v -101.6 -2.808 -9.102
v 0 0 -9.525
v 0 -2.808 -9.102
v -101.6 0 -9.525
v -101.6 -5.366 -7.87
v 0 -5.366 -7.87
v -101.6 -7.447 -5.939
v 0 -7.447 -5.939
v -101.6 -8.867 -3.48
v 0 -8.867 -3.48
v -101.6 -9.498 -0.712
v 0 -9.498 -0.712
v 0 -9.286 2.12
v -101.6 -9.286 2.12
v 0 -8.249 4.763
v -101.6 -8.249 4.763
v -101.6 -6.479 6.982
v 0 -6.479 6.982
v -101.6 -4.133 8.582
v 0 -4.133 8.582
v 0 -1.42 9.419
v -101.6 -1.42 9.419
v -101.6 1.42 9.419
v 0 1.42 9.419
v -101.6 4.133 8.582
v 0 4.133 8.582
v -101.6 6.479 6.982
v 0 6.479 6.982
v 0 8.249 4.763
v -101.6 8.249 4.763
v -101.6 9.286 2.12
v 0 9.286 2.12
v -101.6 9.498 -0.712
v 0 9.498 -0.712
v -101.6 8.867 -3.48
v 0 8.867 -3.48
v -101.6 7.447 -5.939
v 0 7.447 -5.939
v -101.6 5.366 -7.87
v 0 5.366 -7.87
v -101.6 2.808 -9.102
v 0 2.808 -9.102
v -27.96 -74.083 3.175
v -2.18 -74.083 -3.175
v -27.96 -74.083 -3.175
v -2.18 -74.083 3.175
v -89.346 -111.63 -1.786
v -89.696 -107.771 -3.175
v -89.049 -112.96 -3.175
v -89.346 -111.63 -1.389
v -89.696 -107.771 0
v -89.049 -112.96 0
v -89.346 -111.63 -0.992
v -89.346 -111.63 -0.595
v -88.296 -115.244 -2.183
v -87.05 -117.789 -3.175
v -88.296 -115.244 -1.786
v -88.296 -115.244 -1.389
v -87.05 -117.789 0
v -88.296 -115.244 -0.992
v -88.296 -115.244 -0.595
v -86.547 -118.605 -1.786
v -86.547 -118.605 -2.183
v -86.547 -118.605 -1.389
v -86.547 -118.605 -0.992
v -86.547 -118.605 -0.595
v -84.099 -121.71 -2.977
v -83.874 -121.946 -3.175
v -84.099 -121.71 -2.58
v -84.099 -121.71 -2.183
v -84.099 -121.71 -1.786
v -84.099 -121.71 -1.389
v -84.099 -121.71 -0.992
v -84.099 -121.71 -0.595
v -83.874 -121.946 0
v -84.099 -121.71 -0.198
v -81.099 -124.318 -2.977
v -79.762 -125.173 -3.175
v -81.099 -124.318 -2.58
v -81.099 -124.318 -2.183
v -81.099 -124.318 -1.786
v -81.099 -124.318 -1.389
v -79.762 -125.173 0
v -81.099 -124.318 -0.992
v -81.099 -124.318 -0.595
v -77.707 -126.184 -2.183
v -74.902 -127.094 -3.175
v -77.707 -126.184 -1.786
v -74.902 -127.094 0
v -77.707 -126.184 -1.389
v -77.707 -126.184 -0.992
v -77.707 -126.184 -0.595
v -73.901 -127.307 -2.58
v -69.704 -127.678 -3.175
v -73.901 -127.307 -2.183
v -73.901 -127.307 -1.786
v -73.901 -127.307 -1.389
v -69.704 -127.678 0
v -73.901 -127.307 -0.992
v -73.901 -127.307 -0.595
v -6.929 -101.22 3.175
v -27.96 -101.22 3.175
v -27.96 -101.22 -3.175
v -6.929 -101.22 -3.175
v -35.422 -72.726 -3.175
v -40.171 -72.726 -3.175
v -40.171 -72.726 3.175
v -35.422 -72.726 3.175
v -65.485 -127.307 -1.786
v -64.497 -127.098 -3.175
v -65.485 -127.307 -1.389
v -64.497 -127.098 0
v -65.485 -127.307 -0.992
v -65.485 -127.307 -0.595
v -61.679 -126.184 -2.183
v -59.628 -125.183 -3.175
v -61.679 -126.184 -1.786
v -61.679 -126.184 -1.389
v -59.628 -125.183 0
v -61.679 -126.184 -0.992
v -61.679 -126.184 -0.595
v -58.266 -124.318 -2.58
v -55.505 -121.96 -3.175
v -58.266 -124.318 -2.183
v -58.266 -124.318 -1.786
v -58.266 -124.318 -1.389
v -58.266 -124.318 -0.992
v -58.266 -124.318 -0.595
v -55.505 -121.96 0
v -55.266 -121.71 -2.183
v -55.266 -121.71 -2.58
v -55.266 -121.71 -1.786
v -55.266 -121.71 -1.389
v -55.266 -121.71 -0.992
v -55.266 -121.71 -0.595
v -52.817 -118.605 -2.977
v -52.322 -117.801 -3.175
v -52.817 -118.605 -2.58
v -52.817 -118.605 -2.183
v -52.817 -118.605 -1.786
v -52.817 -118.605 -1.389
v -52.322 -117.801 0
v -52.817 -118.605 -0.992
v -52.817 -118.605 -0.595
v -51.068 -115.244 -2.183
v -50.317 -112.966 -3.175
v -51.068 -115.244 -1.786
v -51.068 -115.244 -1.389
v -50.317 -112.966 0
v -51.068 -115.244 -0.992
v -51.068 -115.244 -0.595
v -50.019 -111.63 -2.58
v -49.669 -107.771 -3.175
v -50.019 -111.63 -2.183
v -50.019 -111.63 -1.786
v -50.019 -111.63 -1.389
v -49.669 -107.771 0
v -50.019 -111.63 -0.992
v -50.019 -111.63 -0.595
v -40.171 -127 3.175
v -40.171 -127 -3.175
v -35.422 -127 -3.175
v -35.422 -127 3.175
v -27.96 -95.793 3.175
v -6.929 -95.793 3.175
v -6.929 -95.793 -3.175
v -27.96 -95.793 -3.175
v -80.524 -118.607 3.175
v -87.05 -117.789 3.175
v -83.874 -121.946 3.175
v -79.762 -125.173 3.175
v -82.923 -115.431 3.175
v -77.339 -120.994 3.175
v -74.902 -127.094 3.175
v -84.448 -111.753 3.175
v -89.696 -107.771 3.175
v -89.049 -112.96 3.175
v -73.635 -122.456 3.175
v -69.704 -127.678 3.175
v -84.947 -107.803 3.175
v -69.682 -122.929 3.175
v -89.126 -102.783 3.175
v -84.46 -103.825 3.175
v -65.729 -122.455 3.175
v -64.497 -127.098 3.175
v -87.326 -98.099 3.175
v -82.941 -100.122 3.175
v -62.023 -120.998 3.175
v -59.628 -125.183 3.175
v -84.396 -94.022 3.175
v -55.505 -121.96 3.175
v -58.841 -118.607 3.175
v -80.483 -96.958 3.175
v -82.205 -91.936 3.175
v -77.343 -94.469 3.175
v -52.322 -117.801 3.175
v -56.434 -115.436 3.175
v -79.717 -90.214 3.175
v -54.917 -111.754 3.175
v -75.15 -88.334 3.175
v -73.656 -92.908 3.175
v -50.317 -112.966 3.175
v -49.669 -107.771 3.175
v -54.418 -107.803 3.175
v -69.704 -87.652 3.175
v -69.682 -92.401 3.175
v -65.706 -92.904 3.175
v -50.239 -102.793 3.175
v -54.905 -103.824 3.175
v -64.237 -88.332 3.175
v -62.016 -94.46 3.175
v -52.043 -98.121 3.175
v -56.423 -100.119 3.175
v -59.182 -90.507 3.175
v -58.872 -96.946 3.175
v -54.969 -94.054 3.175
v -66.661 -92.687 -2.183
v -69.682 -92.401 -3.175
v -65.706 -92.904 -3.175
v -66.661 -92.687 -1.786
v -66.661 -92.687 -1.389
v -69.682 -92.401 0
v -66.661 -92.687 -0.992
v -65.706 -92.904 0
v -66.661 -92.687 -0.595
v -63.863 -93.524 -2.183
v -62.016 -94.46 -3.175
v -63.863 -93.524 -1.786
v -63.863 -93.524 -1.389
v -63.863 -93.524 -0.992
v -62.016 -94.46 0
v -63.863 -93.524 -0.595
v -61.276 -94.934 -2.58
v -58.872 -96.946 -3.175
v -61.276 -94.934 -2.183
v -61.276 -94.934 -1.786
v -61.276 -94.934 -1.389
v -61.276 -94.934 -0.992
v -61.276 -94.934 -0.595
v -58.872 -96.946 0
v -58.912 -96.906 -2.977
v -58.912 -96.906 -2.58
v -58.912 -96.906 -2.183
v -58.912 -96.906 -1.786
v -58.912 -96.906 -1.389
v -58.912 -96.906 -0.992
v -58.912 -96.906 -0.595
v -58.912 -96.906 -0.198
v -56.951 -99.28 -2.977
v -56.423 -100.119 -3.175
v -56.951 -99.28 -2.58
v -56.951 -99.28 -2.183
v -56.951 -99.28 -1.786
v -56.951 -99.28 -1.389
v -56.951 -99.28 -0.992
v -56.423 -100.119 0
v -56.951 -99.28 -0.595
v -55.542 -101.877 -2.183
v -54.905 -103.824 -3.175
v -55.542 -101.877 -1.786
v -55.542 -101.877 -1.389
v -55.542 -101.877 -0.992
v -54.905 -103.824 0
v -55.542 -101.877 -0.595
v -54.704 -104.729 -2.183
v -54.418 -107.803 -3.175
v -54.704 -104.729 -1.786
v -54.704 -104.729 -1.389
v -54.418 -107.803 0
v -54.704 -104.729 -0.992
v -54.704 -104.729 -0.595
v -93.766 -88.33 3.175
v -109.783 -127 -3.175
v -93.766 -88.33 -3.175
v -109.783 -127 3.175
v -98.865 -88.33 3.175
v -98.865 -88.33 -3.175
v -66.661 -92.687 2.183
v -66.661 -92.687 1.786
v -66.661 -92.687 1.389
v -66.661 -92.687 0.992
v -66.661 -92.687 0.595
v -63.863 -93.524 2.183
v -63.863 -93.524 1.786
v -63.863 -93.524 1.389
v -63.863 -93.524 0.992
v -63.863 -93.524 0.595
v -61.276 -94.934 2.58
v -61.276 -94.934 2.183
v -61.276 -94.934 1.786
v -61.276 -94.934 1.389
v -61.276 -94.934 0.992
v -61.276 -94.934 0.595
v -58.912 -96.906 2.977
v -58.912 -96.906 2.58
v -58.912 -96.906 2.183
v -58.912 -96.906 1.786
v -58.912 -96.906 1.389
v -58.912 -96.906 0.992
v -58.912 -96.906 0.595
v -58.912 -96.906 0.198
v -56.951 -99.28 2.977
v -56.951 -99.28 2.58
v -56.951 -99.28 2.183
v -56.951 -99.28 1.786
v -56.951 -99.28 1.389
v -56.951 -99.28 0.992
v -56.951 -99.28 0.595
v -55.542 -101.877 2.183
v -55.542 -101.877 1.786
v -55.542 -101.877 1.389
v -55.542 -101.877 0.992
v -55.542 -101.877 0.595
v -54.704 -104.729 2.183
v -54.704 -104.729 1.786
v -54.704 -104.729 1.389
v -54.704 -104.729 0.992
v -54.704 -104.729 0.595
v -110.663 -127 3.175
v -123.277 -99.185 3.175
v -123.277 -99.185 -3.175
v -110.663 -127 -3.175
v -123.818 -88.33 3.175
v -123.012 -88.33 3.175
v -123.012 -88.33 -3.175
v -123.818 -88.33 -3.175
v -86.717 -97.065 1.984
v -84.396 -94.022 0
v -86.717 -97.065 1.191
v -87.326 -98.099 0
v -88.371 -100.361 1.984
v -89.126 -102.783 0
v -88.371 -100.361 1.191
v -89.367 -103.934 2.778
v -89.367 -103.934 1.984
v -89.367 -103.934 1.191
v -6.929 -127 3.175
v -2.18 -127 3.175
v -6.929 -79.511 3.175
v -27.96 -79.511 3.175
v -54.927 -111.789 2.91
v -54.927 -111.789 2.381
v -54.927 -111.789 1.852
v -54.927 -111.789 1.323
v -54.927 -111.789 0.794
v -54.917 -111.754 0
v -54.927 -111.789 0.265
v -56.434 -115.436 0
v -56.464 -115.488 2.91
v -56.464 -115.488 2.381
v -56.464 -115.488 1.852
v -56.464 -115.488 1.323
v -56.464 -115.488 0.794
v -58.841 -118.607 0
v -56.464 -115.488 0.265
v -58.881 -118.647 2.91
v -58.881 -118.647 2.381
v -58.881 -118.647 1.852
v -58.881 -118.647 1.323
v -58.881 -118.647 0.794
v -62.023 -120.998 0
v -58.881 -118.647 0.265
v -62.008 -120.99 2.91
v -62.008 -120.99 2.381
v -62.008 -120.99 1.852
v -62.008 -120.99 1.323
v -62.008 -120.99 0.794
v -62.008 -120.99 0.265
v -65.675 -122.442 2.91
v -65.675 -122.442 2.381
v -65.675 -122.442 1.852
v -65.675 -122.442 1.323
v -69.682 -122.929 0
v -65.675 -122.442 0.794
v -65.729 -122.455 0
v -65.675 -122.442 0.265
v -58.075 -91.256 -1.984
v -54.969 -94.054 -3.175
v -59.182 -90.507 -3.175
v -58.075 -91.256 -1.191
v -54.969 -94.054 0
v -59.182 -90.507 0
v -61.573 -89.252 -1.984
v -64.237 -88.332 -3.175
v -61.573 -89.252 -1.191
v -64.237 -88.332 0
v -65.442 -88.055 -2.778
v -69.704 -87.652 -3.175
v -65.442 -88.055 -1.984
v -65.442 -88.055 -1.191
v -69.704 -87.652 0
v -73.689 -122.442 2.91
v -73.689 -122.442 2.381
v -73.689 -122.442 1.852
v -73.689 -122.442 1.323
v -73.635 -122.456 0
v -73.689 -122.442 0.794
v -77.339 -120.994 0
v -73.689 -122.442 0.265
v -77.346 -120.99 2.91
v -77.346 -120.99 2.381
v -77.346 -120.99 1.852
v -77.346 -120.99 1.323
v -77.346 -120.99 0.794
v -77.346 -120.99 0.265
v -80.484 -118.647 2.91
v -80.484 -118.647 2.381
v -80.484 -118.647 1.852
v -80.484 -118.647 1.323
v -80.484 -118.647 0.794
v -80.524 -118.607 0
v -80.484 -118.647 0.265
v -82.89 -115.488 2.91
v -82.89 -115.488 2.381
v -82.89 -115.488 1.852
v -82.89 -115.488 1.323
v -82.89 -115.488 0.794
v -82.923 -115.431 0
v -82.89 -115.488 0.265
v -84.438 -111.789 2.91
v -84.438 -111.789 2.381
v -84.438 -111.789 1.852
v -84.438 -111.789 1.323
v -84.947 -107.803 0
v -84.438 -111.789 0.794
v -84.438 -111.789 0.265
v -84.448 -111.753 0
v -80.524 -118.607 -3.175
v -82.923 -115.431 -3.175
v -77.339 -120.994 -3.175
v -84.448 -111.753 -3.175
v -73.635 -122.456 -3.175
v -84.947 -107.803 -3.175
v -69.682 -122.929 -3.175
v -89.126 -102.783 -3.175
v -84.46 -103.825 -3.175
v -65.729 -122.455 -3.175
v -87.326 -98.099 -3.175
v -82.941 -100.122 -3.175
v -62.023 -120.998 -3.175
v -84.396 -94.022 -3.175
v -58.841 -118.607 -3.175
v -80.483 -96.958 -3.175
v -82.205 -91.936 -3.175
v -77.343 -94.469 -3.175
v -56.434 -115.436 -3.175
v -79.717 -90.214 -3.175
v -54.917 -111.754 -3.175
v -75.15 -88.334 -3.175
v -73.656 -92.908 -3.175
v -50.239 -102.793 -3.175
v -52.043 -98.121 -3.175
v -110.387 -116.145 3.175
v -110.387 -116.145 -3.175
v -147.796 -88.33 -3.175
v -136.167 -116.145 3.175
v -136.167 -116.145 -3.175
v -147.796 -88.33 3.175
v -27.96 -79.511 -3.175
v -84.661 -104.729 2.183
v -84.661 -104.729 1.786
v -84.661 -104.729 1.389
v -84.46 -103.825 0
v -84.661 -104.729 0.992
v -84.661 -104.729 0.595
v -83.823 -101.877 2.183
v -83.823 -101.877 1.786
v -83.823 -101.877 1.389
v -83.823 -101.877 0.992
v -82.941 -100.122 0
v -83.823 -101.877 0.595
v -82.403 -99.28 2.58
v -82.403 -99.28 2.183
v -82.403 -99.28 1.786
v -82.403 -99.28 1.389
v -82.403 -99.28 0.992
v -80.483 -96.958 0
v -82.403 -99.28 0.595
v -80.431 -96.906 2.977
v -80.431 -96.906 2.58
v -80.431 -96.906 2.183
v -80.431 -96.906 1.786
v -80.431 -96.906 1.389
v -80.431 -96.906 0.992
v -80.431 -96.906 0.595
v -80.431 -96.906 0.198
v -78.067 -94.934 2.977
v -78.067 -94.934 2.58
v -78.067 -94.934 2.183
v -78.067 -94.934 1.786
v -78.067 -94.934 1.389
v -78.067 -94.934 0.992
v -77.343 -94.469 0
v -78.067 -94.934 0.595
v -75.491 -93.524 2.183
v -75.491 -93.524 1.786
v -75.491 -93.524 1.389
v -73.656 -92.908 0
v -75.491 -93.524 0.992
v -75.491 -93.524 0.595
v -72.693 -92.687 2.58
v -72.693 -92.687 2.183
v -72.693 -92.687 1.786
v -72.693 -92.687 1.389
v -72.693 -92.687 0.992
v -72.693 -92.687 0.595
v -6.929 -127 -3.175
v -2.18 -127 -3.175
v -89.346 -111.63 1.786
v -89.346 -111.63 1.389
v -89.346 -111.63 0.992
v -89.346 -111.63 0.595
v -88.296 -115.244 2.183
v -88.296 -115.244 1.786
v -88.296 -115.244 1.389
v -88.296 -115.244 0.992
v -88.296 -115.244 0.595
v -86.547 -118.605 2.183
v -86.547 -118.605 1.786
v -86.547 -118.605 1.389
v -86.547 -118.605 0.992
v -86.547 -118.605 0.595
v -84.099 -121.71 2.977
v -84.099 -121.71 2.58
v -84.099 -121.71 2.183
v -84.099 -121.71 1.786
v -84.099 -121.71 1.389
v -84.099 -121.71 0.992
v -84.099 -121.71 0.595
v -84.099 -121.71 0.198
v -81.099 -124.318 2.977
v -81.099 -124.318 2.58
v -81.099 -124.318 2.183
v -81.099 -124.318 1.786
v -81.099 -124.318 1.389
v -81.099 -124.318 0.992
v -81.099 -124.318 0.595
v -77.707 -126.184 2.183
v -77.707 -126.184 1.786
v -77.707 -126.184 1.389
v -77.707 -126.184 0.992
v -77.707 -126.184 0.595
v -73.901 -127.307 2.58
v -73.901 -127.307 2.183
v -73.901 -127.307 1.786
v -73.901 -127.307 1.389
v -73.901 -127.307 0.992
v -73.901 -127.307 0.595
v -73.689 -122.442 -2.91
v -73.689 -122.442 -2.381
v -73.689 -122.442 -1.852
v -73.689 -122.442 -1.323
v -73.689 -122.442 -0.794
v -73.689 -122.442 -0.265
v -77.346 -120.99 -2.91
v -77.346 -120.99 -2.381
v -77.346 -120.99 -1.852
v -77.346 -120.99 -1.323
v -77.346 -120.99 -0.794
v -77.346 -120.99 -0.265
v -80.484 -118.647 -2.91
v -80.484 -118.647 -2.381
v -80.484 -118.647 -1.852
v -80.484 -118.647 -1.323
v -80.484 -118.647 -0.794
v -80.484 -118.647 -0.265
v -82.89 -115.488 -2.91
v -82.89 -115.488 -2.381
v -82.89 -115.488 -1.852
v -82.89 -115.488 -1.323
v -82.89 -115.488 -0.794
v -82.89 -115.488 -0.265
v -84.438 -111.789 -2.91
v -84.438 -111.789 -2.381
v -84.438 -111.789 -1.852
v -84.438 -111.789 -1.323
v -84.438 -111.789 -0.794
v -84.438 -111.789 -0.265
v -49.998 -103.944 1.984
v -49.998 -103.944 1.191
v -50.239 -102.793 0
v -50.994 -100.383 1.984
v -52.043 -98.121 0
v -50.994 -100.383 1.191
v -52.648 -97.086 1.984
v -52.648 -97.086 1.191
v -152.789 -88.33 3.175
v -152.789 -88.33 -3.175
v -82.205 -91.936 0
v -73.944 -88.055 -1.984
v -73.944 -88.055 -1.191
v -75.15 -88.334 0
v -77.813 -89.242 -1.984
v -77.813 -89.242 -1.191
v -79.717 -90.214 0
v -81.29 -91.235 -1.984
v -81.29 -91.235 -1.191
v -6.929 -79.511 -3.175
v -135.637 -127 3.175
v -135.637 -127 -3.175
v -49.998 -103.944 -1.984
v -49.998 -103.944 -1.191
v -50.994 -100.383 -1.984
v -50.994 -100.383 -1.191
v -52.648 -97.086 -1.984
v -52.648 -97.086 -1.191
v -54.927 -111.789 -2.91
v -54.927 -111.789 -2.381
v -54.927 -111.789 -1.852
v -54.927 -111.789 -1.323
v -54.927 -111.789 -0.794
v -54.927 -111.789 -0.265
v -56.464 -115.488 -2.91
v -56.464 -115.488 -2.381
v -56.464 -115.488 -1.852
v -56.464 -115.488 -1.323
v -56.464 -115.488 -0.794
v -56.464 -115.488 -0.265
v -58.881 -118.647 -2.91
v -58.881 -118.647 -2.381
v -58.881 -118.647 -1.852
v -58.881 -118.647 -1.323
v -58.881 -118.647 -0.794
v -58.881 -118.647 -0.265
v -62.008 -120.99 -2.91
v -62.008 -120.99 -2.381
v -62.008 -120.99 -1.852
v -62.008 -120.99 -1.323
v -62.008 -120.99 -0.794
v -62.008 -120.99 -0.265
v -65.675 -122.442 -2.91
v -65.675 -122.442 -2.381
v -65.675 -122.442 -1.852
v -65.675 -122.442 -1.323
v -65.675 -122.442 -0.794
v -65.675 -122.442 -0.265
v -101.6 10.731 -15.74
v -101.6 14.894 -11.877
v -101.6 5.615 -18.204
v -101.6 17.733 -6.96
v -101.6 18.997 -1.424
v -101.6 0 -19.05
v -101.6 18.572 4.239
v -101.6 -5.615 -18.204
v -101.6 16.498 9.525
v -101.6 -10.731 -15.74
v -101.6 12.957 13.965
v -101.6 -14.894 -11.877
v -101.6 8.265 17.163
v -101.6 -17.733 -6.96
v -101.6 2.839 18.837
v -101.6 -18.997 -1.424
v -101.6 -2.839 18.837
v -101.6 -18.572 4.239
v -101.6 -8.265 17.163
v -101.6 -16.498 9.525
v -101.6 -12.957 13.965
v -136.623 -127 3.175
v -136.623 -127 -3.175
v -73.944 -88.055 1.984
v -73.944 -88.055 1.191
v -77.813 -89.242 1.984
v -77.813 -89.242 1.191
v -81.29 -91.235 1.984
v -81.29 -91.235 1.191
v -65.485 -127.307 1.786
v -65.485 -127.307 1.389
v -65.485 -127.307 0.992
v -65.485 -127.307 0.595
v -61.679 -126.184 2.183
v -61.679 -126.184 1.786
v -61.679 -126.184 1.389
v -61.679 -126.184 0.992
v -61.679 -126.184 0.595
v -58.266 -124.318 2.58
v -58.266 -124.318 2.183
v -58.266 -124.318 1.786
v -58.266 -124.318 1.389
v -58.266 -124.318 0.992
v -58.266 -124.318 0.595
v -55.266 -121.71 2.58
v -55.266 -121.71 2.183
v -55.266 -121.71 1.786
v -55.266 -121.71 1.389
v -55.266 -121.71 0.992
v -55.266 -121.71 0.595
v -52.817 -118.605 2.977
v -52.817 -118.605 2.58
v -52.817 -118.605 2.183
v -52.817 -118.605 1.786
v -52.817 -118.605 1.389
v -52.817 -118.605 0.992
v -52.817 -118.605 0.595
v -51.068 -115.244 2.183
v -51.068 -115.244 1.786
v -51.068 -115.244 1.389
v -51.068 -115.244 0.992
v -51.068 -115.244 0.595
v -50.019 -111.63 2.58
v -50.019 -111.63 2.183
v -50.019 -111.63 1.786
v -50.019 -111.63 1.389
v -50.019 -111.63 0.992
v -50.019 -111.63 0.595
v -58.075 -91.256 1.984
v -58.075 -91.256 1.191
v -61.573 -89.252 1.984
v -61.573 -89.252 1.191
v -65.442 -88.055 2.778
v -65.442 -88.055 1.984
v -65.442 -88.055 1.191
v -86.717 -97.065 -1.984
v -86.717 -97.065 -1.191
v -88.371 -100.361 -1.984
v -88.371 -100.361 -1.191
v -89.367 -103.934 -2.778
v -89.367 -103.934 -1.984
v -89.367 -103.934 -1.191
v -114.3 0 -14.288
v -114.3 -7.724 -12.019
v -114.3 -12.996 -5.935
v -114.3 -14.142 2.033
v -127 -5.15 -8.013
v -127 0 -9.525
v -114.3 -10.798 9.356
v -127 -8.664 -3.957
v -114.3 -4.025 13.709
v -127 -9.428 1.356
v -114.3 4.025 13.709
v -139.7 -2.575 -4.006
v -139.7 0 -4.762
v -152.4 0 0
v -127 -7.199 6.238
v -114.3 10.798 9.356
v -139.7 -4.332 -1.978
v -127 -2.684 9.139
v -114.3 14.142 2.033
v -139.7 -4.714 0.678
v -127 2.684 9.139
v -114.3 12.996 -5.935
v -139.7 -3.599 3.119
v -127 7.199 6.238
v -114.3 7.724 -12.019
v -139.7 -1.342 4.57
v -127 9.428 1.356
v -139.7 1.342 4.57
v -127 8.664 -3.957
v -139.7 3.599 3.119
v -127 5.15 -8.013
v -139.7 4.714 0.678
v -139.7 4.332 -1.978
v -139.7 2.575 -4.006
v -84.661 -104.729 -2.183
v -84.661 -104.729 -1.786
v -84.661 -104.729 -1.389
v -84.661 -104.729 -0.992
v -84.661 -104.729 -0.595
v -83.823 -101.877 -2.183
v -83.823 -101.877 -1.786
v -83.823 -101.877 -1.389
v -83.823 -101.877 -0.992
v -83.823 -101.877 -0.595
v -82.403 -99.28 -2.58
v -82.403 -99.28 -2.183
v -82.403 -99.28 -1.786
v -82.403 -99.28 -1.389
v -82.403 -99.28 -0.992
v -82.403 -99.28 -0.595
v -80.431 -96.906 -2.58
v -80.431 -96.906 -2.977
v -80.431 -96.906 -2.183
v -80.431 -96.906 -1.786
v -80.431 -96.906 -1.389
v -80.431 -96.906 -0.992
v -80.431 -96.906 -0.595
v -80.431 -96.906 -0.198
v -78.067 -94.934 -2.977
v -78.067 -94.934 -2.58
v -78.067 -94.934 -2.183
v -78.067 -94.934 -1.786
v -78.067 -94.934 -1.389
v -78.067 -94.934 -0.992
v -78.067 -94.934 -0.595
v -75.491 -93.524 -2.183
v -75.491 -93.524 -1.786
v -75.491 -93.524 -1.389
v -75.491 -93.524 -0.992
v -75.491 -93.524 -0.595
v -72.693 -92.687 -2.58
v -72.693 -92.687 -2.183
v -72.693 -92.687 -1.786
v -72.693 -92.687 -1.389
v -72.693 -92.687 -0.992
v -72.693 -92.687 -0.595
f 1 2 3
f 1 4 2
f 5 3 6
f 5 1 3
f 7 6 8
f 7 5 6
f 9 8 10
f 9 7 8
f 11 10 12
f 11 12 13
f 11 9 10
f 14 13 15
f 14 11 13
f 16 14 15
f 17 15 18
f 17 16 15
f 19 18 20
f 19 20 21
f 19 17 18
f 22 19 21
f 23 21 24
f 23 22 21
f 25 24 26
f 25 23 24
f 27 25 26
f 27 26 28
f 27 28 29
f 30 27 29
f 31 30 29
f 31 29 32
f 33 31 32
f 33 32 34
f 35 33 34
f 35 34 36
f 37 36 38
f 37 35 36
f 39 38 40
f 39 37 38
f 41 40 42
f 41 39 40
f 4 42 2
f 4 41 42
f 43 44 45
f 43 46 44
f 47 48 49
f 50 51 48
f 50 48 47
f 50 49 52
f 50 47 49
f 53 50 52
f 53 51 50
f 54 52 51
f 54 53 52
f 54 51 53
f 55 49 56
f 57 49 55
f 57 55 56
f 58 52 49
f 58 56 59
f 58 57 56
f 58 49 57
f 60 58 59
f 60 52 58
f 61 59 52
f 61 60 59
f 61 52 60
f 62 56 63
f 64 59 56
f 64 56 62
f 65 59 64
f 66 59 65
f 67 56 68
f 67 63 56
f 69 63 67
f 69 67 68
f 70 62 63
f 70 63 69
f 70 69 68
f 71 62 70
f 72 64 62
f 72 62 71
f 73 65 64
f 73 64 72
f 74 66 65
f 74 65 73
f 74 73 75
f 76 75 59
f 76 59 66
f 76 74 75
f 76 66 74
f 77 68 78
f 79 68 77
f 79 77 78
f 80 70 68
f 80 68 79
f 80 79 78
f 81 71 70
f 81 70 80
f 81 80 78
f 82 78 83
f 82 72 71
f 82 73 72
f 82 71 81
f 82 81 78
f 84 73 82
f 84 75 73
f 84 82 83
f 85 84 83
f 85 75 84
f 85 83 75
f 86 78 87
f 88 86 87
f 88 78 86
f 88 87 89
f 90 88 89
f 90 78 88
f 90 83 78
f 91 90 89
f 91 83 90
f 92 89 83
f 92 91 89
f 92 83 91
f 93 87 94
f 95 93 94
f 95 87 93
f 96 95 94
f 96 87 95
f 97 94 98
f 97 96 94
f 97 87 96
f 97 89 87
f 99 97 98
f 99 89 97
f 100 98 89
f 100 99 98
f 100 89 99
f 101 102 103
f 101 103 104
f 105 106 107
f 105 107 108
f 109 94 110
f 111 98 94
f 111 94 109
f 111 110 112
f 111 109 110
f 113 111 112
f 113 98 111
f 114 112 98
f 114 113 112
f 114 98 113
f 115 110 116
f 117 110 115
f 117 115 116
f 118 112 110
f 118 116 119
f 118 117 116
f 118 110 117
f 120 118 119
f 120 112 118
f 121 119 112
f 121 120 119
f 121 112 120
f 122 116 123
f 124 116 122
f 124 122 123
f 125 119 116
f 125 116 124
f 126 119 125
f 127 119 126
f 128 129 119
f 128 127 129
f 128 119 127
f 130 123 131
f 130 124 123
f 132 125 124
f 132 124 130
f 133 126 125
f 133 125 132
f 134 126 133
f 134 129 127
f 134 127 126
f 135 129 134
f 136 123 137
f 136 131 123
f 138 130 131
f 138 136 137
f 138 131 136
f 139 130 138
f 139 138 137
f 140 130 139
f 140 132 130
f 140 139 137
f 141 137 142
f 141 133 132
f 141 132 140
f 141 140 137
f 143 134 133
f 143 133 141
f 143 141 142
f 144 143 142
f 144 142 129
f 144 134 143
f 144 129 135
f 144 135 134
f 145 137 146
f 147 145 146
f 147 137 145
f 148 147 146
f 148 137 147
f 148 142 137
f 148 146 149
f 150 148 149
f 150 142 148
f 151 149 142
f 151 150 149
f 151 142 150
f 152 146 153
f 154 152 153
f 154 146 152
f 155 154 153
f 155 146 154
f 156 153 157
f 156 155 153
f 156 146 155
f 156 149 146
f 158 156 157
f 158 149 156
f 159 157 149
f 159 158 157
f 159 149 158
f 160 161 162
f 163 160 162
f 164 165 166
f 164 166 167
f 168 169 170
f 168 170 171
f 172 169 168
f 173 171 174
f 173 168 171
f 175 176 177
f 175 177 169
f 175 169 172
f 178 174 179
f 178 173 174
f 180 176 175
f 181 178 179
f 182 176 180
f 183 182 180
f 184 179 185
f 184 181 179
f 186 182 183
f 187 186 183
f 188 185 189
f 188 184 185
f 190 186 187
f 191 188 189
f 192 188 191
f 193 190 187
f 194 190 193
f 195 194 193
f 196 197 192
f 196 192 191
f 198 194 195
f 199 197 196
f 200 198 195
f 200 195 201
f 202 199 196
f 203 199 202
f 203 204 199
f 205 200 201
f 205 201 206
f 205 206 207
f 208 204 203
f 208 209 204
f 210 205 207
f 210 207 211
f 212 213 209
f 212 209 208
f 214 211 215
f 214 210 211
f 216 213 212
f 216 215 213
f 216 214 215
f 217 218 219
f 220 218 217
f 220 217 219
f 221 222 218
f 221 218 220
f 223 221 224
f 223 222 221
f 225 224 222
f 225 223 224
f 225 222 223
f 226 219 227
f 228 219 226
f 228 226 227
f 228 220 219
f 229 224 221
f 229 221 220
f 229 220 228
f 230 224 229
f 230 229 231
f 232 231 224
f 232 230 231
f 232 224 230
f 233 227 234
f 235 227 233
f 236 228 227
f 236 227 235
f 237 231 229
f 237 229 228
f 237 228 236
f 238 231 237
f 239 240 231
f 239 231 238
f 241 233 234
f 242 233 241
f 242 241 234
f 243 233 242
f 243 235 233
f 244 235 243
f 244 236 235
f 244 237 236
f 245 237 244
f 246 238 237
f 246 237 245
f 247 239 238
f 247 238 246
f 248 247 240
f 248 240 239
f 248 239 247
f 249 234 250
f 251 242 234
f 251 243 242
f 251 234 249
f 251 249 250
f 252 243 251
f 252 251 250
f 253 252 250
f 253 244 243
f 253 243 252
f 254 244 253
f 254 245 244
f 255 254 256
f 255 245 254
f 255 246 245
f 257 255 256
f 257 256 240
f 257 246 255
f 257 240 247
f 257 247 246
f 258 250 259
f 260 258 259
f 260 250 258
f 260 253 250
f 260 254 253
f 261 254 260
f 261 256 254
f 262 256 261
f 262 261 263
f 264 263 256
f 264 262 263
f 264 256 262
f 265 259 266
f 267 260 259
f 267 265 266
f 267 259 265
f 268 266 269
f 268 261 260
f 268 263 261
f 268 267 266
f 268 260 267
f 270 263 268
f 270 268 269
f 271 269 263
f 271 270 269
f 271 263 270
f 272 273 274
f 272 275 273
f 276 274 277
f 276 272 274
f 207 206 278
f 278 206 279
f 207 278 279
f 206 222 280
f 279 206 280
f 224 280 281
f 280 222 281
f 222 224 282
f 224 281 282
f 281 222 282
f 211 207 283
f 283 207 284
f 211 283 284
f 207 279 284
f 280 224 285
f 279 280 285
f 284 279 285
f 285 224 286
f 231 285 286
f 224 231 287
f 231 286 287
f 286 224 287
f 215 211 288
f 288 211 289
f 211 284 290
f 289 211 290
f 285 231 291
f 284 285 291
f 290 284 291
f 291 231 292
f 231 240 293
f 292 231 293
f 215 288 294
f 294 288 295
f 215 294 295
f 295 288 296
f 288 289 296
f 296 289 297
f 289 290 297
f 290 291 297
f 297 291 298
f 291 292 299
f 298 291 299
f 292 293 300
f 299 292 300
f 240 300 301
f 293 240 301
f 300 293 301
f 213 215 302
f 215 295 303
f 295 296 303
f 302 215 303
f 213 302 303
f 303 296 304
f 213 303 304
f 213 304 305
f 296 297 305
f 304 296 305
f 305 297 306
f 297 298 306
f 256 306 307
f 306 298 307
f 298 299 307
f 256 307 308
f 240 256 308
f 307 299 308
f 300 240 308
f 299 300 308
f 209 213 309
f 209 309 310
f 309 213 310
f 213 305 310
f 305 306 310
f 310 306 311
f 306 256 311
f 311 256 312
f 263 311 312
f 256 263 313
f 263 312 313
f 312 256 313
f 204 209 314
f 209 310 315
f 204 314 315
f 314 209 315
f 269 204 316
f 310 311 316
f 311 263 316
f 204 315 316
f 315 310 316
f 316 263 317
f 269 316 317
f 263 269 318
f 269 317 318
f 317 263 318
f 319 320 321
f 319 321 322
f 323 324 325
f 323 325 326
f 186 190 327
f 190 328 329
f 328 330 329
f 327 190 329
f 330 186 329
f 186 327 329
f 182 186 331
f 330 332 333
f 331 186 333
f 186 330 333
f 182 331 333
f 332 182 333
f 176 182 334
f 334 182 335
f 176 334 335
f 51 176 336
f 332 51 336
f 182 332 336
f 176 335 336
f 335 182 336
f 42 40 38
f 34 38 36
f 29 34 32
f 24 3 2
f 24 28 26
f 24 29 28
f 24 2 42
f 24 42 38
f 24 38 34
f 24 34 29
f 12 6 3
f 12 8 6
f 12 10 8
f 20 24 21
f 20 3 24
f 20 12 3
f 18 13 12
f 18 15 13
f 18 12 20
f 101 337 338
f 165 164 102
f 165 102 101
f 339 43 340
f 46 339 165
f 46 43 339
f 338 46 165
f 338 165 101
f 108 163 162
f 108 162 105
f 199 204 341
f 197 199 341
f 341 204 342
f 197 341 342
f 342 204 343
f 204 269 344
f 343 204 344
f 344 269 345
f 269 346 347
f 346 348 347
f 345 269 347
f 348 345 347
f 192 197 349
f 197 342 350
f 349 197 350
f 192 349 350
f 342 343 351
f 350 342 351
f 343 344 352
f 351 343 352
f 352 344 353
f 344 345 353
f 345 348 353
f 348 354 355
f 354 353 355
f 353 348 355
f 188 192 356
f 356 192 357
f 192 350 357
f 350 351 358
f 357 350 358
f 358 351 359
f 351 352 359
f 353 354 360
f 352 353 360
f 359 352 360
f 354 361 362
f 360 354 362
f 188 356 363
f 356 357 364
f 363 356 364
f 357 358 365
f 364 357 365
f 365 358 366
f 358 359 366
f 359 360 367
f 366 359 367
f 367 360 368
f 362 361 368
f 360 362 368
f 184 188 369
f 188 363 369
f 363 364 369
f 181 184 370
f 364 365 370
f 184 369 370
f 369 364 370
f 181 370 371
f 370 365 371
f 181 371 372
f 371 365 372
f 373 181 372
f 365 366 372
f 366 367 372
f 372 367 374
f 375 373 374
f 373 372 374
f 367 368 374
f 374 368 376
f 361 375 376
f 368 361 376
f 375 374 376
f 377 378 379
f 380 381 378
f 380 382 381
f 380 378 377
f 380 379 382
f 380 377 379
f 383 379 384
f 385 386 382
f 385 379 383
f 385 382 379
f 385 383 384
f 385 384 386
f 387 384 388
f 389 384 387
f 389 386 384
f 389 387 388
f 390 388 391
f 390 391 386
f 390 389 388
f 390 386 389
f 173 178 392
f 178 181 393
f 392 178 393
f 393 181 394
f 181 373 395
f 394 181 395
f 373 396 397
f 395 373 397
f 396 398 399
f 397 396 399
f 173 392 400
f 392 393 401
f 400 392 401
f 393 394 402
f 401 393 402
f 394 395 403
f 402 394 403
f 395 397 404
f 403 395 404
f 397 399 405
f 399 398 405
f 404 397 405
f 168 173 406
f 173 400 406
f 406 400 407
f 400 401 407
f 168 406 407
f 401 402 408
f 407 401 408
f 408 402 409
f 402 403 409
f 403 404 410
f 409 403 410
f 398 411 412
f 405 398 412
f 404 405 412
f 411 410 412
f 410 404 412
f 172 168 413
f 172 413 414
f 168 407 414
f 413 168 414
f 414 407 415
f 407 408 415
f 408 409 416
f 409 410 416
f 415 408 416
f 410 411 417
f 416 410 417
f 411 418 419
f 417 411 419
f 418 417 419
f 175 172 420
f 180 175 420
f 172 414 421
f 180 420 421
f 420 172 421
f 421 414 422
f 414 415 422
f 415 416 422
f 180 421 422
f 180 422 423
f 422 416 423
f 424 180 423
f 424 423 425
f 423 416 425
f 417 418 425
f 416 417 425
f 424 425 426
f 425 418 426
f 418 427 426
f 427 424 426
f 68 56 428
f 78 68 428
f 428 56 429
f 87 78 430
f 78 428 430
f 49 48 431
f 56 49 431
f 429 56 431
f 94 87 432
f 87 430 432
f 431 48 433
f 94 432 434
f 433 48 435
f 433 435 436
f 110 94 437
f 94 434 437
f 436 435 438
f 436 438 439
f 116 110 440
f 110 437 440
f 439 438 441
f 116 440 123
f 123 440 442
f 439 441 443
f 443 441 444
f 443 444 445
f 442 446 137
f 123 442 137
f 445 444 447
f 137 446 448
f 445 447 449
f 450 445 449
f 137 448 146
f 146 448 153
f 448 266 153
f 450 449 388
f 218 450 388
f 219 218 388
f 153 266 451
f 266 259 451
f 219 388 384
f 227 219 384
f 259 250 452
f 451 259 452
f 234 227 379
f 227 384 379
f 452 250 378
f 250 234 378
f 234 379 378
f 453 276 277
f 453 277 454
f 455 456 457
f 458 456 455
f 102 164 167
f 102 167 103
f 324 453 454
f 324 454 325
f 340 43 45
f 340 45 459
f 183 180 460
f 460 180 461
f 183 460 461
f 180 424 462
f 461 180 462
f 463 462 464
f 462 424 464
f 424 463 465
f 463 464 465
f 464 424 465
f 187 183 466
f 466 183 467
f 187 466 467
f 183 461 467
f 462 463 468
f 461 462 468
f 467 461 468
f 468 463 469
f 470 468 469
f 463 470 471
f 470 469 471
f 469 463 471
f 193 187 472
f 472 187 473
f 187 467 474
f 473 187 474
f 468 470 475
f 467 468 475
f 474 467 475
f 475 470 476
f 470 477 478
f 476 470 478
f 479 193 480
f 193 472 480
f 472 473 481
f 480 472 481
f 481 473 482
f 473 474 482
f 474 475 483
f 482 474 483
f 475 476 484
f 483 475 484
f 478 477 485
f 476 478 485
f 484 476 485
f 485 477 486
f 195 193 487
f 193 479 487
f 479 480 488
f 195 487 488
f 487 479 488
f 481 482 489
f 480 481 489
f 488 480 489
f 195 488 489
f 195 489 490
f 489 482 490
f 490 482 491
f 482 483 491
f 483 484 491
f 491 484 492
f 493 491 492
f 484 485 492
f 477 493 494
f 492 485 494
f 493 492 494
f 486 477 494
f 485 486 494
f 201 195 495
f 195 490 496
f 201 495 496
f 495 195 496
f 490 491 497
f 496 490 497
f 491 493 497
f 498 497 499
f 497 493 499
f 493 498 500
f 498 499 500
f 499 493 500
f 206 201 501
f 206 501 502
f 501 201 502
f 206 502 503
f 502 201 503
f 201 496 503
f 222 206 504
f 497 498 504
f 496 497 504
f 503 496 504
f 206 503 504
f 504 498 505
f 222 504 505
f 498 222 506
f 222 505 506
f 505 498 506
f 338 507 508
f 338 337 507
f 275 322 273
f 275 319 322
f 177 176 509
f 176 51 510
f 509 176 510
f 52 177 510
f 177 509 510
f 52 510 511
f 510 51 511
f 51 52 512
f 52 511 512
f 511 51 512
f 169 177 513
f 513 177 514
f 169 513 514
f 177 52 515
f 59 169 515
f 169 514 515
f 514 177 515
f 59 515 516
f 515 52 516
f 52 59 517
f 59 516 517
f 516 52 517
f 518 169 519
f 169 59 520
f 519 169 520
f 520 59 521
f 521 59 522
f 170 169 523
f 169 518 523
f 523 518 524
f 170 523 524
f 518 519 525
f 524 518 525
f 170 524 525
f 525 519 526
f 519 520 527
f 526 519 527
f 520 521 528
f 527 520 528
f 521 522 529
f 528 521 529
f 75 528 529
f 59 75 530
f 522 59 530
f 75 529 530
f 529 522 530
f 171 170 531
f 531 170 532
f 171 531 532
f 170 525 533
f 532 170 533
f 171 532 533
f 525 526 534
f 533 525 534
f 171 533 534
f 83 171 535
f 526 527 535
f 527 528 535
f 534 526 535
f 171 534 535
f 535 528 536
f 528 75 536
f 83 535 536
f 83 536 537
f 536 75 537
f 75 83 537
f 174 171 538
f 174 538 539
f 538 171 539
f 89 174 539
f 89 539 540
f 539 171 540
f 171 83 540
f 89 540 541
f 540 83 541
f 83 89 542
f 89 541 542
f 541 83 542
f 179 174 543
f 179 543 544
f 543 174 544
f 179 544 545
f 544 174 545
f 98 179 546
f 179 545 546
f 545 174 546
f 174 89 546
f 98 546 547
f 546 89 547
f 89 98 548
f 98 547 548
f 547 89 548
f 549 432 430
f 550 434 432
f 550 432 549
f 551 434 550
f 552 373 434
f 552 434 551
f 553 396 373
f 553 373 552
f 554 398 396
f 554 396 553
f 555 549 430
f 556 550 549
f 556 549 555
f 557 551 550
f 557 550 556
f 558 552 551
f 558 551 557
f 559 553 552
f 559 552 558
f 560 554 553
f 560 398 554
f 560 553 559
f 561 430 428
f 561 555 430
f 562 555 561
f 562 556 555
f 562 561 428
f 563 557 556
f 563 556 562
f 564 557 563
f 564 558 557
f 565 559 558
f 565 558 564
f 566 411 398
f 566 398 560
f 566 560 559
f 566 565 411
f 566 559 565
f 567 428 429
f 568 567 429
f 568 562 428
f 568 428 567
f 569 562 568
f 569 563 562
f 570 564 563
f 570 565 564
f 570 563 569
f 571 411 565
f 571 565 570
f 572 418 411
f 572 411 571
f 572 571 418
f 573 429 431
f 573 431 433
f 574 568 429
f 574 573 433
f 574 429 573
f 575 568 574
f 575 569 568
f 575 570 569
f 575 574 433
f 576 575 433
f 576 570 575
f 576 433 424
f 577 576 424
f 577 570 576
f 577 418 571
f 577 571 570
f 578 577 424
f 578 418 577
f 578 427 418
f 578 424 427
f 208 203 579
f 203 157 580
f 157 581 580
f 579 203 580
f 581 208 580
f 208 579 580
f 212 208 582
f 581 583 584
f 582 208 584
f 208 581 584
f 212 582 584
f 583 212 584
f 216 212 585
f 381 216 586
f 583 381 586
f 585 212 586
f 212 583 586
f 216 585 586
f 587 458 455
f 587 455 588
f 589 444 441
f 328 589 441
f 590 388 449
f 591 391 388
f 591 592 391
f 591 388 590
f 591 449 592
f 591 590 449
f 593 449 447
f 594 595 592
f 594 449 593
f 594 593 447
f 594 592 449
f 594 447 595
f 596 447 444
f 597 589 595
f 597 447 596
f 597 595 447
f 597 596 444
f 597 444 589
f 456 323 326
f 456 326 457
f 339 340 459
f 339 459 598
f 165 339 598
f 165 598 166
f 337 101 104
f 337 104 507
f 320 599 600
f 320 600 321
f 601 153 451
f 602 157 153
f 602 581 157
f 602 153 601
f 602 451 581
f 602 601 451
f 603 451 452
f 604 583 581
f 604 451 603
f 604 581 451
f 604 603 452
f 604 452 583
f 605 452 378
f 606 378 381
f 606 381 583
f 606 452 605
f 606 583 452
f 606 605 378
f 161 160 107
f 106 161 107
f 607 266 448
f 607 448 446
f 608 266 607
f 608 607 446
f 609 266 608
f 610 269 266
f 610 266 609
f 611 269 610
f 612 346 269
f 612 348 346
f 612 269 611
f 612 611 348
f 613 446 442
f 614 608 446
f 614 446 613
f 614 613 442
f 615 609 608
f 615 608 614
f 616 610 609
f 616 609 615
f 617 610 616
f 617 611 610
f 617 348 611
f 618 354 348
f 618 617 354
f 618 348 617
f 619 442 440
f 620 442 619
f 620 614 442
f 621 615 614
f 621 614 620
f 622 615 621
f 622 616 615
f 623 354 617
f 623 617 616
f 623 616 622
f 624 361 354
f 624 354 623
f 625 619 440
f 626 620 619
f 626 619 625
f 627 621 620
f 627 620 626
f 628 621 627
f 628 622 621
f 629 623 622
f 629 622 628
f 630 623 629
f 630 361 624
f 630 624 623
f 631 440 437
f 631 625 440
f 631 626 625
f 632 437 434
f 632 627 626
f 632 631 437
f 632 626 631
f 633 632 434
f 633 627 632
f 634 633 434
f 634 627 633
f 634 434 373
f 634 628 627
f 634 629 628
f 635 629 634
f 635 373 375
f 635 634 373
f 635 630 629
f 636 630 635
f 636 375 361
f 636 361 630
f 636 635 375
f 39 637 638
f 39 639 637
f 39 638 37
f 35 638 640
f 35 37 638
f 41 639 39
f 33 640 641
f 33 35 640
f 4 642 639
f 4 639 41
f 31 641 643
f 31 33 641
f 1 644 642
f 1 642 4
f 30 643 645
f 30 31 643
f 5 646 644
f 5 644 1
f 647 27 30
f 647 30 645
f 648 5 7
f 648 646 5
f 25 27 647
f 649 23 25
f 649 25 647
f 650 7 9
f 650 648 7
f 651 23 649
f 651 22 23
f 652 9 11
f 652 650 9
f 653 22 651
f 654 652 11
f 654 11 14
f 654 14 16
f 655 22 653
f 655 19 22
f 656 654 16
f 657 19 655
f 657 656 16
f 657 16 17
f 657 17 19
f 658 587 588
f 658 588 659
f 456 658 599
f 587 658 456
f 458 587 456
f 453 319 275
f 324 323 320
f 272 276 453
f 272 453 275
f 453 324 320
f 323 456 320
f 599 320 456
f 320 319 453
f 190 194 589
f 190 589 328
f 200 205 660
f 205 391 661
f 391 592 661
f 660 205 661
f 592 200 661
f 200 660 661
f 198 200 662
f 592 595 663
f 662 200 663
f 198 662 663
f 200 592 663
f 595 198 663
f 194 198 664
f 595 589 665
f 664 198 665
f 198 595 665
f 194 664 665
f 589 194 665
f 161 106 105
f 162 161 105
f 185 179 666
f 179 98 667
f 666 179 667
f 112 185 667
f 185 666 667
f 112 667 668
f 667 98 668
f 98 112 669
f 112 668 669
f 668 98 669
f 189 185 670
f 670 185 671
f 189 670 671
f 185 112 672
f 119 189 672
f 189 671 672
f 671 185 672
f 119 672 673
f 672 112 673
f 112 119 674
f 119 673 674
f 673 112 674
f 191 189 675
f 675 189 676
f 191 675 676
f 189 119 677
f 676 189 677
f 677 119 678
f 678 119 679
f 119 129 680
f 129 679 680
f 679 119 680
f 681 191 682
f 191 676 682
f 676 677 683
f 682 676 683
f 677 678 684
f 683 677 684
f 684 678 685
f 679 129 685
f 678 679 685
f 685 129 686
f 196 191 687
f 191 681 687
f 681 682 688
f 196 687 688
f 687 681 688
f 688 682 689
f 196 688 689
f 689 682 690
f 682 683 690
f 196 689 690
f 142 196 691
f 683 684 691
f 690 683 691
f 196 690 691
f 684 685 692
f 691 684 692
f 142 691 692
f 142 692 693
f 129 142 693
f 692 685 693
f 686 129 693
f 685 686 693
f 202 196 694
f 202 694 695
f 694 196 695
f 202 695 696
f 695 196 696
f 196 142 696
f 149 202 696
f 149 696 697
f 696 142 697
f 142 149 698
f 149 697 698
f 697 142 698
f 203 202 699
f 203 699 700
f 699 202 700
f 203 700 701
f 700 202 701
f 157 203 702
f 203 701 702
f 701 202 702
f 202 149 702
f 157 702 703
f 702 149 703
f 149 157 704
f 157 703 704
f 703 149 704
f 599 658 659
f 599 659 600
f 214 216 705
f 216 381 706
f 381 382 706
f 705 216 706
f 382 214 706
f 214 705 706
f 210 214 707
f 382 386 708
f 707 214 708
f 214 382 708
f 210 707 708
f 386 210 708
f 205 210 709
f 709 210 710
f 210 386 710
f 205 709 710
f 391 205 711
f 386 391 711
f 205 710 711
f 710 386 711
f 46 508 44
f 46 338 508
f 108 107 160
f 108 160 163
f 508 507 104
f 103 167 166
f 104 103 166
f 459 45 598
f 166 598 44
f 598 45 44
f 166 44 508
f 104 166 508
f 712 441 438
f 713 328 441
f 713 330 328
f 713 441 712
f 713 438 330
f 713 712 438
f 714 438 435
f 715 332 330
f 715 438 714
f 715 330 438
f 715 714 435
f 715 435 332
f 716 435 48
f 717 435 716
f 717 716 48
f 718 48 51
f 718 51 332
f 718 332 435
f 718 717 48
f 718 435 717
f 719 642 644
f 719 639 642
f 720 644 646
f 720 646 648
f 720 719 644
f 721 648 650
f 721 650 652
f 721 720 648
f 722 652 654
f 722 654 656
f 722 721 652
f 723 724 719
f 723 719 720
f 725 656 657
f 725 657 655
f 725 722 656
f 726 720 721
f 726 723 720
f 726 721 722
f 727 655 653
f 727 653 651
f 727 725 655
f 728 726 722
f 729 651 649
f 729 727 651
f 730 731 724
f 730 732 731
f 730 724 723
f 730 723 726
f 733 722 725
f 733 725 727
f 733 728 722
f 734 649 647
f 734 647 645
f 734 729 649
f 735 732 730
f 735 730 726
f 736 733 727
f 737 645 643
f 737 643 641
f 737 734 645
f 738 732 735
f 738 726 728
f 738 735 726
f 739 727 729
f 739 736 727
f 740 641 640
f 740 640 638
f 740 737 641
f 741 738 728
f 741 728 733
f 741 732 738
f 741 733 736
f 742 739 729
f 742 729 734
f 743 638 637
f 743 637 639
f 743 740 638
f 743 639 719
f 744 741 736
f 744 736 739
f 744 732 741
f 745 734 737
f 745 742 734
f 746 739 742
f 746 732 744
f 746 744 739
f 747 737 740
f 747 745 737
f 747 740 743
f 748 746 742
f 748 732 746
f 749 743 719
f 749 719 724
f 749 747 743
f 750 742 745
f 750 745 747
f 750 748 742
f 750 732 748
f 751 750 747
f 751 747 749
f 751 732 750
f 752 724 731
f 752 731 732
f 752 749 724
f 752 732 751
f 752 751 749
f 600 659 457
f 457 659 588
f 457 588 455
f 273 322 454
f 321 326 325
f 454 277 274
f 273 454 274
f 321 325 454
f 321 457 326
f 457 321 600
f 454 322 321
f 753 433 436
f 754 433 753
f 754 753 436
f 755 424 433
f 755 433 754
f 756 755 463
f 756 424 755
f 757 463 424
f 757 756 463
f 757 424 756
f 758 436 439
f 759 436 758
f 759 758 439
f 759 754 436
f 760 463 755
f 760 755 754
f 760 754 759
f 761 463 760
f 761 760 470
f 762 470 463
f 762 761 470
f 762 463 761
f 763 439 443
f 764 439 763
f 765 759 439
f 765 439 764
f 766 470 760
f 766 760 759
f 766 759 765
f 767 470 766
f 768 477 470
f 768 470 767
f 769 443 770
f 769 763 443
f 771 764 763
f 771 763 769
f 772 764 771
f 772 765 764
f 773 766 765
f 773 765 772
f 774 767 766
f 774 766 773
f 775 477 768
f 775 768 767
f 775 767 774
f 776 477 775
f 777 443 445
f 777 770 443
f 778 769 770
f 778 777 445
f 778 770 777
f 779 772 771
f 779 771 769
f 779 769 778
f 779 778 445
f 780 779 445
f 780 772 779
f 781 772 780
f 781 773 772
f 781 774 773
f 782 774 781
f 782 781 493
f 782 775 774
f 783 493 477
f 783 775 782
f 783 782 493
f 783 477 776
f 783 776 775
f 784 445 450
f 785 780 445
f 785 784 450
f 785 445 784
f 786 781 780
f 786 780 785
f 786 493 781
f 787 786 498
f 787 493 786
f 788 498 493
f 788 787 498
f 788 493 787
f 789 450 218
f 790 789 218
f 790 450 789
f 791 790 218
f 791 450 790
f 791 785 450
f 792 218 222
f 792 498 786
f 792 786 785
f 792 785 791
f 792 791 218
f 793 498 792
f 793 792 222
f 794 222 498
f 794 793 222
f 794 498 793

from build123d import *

# Parameters (mm, degrees)
BOSS_EXTRUDE1_DEPTH   = 3.175
BOSS_EXTRUDE1_2_DEPTH = 3.175
SKETCH2_W             = 4.748931624
SKETCH2_H             = 54.273504274
BOSS_EXTRUDE1_3_DEPTH = 3.175
BOSS_EXTRUDE1_4_DEPTH = 3.175


with BuildPart() as part:
    # Sketch1 → Revolve1 (revolve)
    with BuildSketch(Plane(origin=(0, 0, 0), x_dir=(1, 0, 0), z_dir=(0, 1, 0))):
        Polygon((0, 0), (0, 9.525), (-101.6, 9.525), (-101.6, 19.05), (-152.4, 0), align=None)
    revolve(axis=Axis((0, 0, 0), (-1, 0, 0)))


with BuildPart() as body_2:
    # Sketch2 → Boss-Extrude1 (new, symmetric)
    with BuildSketch(Plane.XY):
        Polygon((-93.766213925, -88.330128205), (-98.864955245, -88.330128205), (-110.387474609, -116.145299145), (-123.012424529, -88.330128205), (-123.818046858, -88.330128205), (-136.167389139, -116.145299145), (-147.795911441, -88.330128205), (-152.788649822, -88.330128205), (-136.623201772, -127), (-135.637374449, -127), (-123.277431874, -99.18482906), (-110.663082248, -127), (-109.783257862, -127), align=None)
    extrude(amount=BOSS_EXTRUDE1_DEPTH, both=True)


with BuildPart() as body_3:
    # Sketch2 → Boss-Extrude1 2 (new, symmetric)
    with BuildSketch(Plane.XY):
        with BuildLine():
            add(Edge.make_bspline(
                [(-69.703546991, -87.651709402), (-70.429129331, -87.667159422), (-71.851818975, -87.697453137), (-73.935342964, -88.021227023), (-75.924180138, -88.516335984), (-77.825947567, -89.200798887), (-79.616289177, -90.118252187), (-81.321282987, -91.213011708), (-82.936254431, -92.509962825), (-83.904221659, -93.51323362), (-84.395554203, -94.022485978)],
                knots=[0, 0, 0, 0, 1.054011418, 2.066658804, 3.057071809, 4.030435133, 4.997543892, 5.974964718, 6.972108034, 8, 8, 8, 8], degree=3))
            add(Edge.make_bspline(
                [(-84.395554203, -94.022485978), (-84.818614699, -94.509530763), (-85.656548305, -95.474194675), (-86.730994291, -97.038345014), (-87.656605975, -98.658201296), (-88.398391218, -100.355273973), (-88.983271933, -102.114748168), (-89.398527103, -103.942671432), (-89.645526, -105.835006919), (-89.678832762, -107.120183995), (-89.695701105, -107.771067041)],
                knots=[0, 0, 0, 0, 1.025258237, 2.030674902, 3.01204498, 3.988269485, 4.97094183, 5.956517959, 6.965070386, 8, 8, 8, 8], degree=3))
            add(Edge.make_bspline(
                [(-89.695701105, -107.771067041), (-89.680864219, -108.425722675), (-89.651545841, -109.719352738), (-89.374207831, -111.62464553), (-88.942844985, -113.472114873), (-88.325506479, -115.254026076), (-87.533901732, -116.975825967), (-86.567935385, -118.629994153), (-85.420828792, -120.219794263), (-84.12053027, -121.731726817), (-82.683436428, -123.125192208), (-81.124418471, -124.33967914), (-79.474113437, -125.380195044), (-77.710577025, -126.218340852), (-75.849913831, -126.879189892), (-73.888110539, -127.343344903), (-71.828214833, -127.623979883), (-70.421731844, -127.660017241), (-69.703546991, -127.678418803)],
                knots=[0, 0, 0, 0, 0.998656419, 1.973391657, 2.932242238, 3.890759089, 4.846373663, 5.82037756, 6.809684879, 7.83454468, 8.860553229, 9.859544525, 10.845671541, 11.83227036, 12.833544569, 13.85385346, 14.904124723, 16, 16, 16, 16], degree=3))
            add(Edge.make_bspline(
                [(-69.703546991, -127.678418803), (-68.981843494, -127.65995548), (-67.568350734, -127.623794127), (-65.501184102, -127.34443521), (-63.535864864, -126.879403807), (-61.672765815, -126.216169095), (-59.901647295, -125.380168255), (-58.24178002, -124.342824853), (-56.681495583, -123.12483203), (-55.244097723, -121.73182441), (-53.943880714, -120.219769118), (-52.796753088, -118.630000679), (-51.830792205, -116.975824266), (-51.039186027, -115.25402653), (-50.421847903, -113.472114752), (-49.990484954, -111.624645563), (-49.713146972, -109.719352729), (-49.68382859, -108.425722672), (-49.668991703, -107.771067041)],
                knots=[0, 0, 0, 0, 1.099876186, 2.154163076, 3.173186993, 4.173200201, 5.163417411, 6.152872554, 7.150605724, 8.17532212, 9.198891216, 10.186952605, 11.159729845, 12.11414092, 13.071450619, 14.029093627, 15.002601286, 16, 16, 16, 16], degree=3))
            add(Edge.make_bspline(
                [(-49.668991703, -107.771067041), (-49.685975086, -107.123721644), (-49.719599265, -105.842089013), (-49.966349818, -103.953310834), (-50.379985137, -102.128481261), (-50.965566964, -100.375798469), (-51.714189493, -98.68616271), (-52.62679468, -97.062303956), (-53.712200672, -95.505226496), (-54.546801606, -94.541809334), (-54.969138605, -94.054286859)],
                knots=[0, 0, 0, 0, 1.031353054, 2.041901799, 3.029428768, 4.008703097, 4.981709435, 5.96992636, 6.972712378, 8, 8, 8, 8], degree=3))
            add(Edge.make_bspline(
                [(-54.969138605, -94.054286859), (-55.459730397, -93.540618135), (-56.424565482, -92.530398204), (-58.047576008, -91.237227899), (-59.748375446, -90.119687259), (-61.558502306, -89.220463525), (-63.45870742, -88.512309745), (-65.457736444, -88.019950171), (-67.548330547, -87.698619685), (-68.977981961, -87.667501997), (-69.703546991, -87.651709402)],
                knots=[0, 0, 0, 0, 1.027980169, 2.021703884, 2.998553061, 3.971491411, 4.943284454, 5.930300938, 6.949603206, 8, 8, 8, 8], degree=3))
        make_face()
        with BuildLine():
            add(Edge.make_bspline(
                [(-69.682346404, -92.400641026), (-69.169242042, -92.415224733), (-68.156279025, -92.444015672), (-66.665244828, -92.662998517), (-65.22984012, -93.009942924), (-63.847341643, -93.502885203), (-62.522411536, -94.13938046), (-61.253781286, -94.92116162), (-60.037719396, -95.837874177), (-58.898014391, -96.888083617), (-57.852043719, -98.035301748), (-56.937674311, -99.257651936), (-56.160175679, -100.53530741), (-55.512473276, -101.869596792), (-55.03006698, -103.274041622), (-54.679712949, -104.732736879), (-54.460936695, -106.248654486), (-54.432416447, -107.279184167), (-54.417923327, -107.802867922)],
                knots=[0, 0, 0, 0, 1.021534396, 2.016698045, 2.994645724, 3.958388632, 4.93408049, 5.916473867, 6.921342795, 7.962252576, 8.998418191, 10.008913653, 10.997312074, 11.973003931, 12.956656626, 13.948281152, 14.957379055, 16, 16, 16, 16], degree=3))
            add(Edge.make_bspline(
                [(-54.417923327, -107.802867922), (-54.44221697, -108.479475952), (-54.490435309, -109.822416368), (-54.882551383, -111.800155961), (-55.538510615, -113.698833963), (-56.424294487, -115.5073198), (-57.534126602, -117.180579241), (-58.841728682, -118.672398112), (-60.333067009, -119.960326452), (-61.990364095, -121.028953521), (-63.779768663, -121.878035542), (-65.673524947, -122.479758151), (-67.648687821, -122.8709135), (-68.998527447, -122.909791744), (-69.682346404, -122.929487179)],
                knots=[0, 0, 0, 0, 1.016792936, 2.018143844, 3.017858371, 4.030088057, 5.03801393, 6.028138512, 7.003788237, 7.991172063, 8.984598303, 9.972568034, 10.972917682, 12, 12, 12, 12], degree=3))
            add(Edge.make_bspline(
                [(-69.682346404, -122.929487179), (-70.366126029, -122.90967699), (-71.715888016, -122.870572225), (-73.688306523, -122.481728165), (-75.576886812, -121.875399009), (-77.36443279, -121.029908455), (-79.020975485, -119.956268375), (-80.523039581, -118.679670769), (-81.819476916, -117.176628017), (-82.92821118, -115.505103474), (-83.828501219, -113.701637674), (-84.481390103, -111.799805533), (-84.874448842, -109.822505614), (-84.922539943, -108.479505852), (-84.946769481, -107.802867922)],
                knots=[0, 0, 0, 0, 1.02726834, 2.027799167, 3.010890988, 4.004497153, 4.992059811, 5.971914811, 6.958719428, 7.966827853, 8.981595046, 9.981490638, 10.983022906, 12, 12, 12, 12], degree=3))
            add(Edge.make_bspline(
                [(-84.946769481, -107.802867922), (-84.93228135, -107.279181038), (-84.903770922, -106.248645197), (-84.684923246, -104.732772387), (-84.33483354, -103.273911343), (-83.851453136, -101.870077484), (-83.206565069, -100.531852716), (-82.414073079, -99.261403271), (-81.503437337, -98.031067396), (-80.444845152, -96.891792113), (-79.306329796, -95.837464774), (-78.089775052, -94.920806149), (-76.823025972, -94.142816312), (-75.501945019, -93.497441008), (-74.119269294, -93.014427648), (-72.685875794, -92.660995244), (-71.20120331, -92.44494108), (-70.191870157, -92.415502156), (-69.682346404, -92.400641026)],
                knots=[0, 0, 0, 0, 1.042956736, 2.052379634, 3.044323526, 4.02829302, 5.004299113, 5.996692471, 7.007513377, 8.048758398, 9.090003419, 10.095195979, 11.07790575, 12.047570684, 13.018257071, 13.989683339, 14.985167495, 16, 16, 16, 16], degree=3))
        make_face(mode=Mode.SUBTRACT)
    extrude(amount=BOSS_EXTRUDE1_2_DEPTH, both=True)


with BuildPart() as body_4:
    # Sketch2 → Boss-Extrude1 3 (new, symmetric)
    with BuildSketch(Plane.XY):
        with Locations((-37.796662643, -99.863247863)):
            Rectangle(SKETCH2_W, SKETCH2_H)
    extrude(amount=BOSS_EXTRUDE1_3_DEPTH, both=True)


with BuildPart() as body_5:
    # Sketch2 → Boss-Extrude1 4 (new, symmetric)
    with BuildSketch(Plane.XY):
        Polygon((-2.179675464, -74.083333333), (-27.959589993, -74.083333333), (-27.959589993, -79.510683761), (-6.928607087, -79.510683761), (-6.928607087, -95.792735043), (-27.959589993, -95.792735043), (-27.959589993, -101.22008547), (-6.928607087, -101.22008547), (-6.928607087, -127), (-2.179675464, -127), align=None)
    extrude(amount=BOSS_EXTRUDE1_4_DEPTH, both=True)


solid = Compound([part.part, body_2.part, body_3.part, body_4.part, body_5.part])
